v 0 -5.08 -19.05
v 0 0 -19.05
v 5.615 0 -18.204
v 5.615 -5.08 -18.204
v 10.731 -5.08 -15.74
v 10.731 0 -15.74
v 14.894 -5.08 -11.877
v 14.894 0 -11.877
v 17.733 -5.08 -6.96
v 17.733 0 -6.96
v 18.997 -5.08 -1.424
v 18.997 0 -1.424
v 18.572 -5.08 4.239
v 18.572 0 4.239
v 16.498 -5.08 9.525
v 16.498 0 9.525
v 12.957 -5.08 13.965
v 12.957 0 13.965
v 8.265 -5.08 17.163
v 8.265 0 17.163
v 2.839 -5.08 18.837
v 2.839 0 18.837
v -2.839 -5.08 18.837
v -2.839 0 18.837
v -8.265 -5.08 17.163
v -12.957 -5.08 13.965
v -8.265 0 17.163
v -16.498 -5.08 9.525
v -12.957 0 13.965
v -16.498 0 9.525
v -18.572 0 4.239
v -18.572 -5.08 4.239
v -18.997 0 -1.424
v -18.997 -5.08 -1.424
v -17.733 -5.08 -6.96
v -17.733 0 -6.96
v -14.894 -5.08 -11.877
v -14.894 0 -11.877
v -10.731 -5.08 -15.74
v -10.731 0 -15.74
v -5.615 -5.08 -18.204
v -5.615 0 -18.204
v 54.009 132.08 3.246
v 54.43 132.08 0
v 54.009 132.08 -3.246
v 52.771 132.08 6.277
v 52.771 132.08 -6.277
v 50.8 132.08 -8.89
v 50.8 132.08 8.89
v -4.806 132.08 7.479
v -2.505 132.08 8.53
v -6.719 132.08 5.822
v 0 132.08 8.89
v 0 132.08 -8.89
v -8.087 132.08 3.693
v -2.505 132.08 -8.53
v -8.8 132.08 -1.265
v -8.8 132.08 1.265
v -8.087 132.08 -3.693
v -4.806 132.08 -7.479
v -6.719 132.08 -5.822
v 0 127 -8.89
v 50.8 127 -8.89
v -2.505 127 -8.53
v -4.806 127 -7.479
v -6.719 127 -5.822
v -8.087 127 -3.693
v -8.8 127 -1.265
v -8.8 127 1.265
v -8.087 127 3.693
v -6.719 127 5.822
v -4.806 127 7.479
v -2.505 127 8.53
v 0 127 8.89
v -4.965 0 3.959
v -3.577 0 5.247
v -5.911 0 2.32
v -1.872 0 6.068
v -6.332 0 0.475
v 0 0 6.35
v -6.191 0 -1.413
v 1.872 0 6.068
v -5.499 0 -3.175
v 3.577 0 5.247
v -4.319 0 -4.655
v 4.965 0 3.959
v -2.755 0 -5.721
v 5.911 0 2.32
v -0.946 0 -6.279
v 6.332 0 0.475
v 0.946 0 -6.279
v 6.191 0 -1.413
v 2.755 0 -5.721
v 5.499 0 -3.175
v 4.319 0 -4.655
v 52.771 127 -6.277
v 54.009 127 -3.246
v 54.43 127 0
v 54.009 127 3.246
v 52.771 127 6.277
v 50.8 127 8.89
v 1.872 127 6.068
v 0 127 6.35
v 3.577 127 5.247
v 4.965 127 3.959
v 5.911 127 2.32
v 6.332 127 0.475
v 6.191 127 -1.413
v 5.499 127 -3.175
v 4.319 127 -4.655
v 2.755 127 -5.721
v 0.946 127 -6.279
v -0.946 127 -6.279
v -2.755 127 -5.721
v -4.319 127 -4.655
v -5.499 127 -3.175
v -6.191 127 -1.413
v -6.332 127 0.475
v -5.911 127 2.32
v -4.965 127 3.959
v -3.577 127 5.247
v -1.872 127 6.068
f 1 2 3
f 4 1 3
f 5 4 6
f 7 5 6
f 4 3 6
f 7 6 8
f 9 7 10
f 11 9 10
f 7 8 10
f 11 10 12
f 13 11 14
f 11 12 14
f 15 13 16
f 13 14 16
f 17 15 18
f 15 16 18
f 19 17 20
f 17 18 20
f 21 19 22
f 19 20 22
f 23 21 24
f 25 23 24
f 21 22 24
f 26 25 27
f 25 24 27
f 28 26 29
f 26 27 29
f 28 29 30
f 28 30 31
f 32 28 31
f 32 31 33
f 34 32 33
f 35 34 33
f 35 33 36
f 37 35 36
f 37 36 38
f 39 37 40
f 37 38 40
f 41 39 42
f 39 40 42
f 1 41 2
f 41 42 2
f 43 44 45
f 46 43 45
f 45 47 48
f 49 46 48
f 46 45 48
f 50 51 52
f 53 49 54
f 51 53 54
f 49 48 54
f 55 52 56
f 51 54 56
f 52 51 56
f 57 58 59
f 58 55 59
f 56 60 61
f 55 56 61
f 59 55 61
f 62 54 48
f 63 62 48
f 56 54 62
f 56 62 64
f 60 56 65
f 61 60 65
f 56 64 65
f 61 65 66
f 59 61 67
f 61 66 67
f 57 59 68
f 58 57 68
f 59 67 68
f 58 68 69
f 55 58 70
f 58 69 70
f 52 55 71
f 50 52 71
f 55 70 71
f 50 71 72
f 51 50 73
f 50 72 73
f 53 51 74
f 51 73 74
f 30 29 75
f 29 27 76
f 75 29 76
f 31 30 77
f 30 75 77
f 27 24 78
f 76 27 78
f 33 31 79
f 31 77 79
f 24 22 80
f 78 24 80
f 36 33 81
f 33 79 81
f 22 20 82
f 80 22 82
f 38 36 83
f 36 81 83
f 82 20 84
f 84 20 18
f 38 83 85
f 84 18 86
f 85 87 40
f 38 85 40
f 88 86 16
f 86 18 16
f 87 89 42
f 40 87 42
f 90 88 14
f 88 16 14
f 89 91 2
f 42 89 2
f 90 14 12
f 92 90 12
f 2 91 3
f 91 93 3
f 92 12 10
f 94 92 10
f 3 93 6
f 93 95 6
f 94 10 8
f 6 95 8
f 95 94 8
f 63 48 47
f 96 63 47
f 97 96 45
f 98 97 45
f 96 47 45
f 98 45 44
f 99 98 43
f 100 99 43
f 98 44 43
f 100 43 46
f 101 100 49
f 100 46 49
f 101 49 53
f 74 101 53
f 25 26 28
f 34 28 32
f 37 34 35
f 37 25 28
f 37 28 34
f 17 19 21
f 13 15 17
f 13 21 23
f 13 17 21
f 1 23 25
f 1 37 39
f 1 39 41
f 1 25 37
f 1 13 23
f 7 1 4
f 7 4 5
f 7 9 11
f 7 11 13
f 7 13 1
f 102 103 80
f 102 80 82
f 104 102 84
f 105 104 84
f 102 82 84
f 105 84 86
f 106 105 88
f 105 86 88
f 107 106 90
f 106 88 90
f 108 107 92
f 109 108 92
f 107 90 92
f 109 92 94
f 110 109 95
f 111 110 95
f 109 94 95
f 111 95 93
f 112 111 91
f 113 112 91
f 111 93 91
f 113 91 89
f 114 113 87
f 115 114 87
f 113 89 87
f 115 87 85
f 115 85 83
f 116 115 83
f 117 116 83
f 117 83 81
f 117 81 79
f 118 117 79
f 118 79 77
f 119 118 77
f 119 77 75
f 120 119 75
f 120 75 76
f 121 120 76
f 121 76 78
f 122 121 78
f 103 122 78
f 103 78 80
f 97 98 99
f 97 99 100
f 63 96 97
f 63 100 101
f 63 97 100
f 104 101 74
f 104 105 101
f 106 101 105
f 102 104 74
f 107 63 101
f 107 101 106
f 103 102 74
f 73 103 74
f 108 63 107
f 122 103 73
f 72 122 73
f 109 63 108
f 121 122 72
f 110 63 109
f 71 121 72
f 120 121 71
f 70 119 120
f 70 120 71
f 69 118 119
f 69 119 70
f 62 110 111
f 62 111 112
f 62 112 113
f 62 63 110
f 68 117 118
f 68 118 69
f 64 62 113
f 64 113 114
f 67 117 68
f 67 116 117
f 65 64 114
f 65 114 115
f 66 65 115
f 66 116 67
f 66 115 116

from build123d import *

# Parameters (mm, degrees)
SKETCH1_R           = 6.35
BOSS_EXTRUDE2_DEPTH = 127
SKETCH2_R           = 8.89
BOSS_EXTRUDE3_DEPTH = 5.08
BOSS_EXTRUDE5_DEPTH = 5.08
SKETCH4_R           = 19.05
BOSS_EXTRUDE6_DEPTH = 5.08


with BuildPart() as part:
    # Sketch1 → Boss-Extrude2 (new body)
    with BuildSketch(Plane(origin=(0, 0, 0), x_dir=(1, 0, 0), z_dir=(0, 1, 0))):
        with Locations(Location((0, 0, 0), (0, 0, 270))):
            Circle(SKETCH1_R)
    extrude(amount=BOSS_EXTRUDE2_DEPTH)

    # Sketch2 → Boss-Extrude3 (add)
    with BuildSketch(Plane(origin=(0, 127, 0), x_dir=(1, 0, 0), z_dir=(0, 1, 0))):
        with Locations(Location((0, 0, 0), (0, 0, 270))):
            Circle(SKETCH2_R)
    extrude(amount=BOSS_EXTRUDE3_DEPTH)

    # Sketch3 → Boss-Extrude5 (add)
    with BuildSketch(Plane(origin=(0, 132.08, 0), x_dir=(1, 0, 0), z_dir=(0, 1, 0))):
        with BuildLine():
            Line((0, 8.89), (50.8, 8.89))
            ThreePointArc((50.8, 8.89), (54.430385896, 0), (50.8, -8.89))
            Line((50.8, -8.89), (0, -8.89))
            Line((0, -8.89), (0, 8.89))
        make_face()
    extrude(amount=-BOSS_EXTRUDE5_DEPTH)

    # Sketch4 → Boss-Extrude6 (add)
    with BuildSketch(Plane.XZ):
        with Locations(Location((0, 0, 0), (0, 0, 270))):
            Circle(SKETCH4_R)
    extrude(amount=BOSS_EXTRUDE6_DEPTH)


solid = part.part
